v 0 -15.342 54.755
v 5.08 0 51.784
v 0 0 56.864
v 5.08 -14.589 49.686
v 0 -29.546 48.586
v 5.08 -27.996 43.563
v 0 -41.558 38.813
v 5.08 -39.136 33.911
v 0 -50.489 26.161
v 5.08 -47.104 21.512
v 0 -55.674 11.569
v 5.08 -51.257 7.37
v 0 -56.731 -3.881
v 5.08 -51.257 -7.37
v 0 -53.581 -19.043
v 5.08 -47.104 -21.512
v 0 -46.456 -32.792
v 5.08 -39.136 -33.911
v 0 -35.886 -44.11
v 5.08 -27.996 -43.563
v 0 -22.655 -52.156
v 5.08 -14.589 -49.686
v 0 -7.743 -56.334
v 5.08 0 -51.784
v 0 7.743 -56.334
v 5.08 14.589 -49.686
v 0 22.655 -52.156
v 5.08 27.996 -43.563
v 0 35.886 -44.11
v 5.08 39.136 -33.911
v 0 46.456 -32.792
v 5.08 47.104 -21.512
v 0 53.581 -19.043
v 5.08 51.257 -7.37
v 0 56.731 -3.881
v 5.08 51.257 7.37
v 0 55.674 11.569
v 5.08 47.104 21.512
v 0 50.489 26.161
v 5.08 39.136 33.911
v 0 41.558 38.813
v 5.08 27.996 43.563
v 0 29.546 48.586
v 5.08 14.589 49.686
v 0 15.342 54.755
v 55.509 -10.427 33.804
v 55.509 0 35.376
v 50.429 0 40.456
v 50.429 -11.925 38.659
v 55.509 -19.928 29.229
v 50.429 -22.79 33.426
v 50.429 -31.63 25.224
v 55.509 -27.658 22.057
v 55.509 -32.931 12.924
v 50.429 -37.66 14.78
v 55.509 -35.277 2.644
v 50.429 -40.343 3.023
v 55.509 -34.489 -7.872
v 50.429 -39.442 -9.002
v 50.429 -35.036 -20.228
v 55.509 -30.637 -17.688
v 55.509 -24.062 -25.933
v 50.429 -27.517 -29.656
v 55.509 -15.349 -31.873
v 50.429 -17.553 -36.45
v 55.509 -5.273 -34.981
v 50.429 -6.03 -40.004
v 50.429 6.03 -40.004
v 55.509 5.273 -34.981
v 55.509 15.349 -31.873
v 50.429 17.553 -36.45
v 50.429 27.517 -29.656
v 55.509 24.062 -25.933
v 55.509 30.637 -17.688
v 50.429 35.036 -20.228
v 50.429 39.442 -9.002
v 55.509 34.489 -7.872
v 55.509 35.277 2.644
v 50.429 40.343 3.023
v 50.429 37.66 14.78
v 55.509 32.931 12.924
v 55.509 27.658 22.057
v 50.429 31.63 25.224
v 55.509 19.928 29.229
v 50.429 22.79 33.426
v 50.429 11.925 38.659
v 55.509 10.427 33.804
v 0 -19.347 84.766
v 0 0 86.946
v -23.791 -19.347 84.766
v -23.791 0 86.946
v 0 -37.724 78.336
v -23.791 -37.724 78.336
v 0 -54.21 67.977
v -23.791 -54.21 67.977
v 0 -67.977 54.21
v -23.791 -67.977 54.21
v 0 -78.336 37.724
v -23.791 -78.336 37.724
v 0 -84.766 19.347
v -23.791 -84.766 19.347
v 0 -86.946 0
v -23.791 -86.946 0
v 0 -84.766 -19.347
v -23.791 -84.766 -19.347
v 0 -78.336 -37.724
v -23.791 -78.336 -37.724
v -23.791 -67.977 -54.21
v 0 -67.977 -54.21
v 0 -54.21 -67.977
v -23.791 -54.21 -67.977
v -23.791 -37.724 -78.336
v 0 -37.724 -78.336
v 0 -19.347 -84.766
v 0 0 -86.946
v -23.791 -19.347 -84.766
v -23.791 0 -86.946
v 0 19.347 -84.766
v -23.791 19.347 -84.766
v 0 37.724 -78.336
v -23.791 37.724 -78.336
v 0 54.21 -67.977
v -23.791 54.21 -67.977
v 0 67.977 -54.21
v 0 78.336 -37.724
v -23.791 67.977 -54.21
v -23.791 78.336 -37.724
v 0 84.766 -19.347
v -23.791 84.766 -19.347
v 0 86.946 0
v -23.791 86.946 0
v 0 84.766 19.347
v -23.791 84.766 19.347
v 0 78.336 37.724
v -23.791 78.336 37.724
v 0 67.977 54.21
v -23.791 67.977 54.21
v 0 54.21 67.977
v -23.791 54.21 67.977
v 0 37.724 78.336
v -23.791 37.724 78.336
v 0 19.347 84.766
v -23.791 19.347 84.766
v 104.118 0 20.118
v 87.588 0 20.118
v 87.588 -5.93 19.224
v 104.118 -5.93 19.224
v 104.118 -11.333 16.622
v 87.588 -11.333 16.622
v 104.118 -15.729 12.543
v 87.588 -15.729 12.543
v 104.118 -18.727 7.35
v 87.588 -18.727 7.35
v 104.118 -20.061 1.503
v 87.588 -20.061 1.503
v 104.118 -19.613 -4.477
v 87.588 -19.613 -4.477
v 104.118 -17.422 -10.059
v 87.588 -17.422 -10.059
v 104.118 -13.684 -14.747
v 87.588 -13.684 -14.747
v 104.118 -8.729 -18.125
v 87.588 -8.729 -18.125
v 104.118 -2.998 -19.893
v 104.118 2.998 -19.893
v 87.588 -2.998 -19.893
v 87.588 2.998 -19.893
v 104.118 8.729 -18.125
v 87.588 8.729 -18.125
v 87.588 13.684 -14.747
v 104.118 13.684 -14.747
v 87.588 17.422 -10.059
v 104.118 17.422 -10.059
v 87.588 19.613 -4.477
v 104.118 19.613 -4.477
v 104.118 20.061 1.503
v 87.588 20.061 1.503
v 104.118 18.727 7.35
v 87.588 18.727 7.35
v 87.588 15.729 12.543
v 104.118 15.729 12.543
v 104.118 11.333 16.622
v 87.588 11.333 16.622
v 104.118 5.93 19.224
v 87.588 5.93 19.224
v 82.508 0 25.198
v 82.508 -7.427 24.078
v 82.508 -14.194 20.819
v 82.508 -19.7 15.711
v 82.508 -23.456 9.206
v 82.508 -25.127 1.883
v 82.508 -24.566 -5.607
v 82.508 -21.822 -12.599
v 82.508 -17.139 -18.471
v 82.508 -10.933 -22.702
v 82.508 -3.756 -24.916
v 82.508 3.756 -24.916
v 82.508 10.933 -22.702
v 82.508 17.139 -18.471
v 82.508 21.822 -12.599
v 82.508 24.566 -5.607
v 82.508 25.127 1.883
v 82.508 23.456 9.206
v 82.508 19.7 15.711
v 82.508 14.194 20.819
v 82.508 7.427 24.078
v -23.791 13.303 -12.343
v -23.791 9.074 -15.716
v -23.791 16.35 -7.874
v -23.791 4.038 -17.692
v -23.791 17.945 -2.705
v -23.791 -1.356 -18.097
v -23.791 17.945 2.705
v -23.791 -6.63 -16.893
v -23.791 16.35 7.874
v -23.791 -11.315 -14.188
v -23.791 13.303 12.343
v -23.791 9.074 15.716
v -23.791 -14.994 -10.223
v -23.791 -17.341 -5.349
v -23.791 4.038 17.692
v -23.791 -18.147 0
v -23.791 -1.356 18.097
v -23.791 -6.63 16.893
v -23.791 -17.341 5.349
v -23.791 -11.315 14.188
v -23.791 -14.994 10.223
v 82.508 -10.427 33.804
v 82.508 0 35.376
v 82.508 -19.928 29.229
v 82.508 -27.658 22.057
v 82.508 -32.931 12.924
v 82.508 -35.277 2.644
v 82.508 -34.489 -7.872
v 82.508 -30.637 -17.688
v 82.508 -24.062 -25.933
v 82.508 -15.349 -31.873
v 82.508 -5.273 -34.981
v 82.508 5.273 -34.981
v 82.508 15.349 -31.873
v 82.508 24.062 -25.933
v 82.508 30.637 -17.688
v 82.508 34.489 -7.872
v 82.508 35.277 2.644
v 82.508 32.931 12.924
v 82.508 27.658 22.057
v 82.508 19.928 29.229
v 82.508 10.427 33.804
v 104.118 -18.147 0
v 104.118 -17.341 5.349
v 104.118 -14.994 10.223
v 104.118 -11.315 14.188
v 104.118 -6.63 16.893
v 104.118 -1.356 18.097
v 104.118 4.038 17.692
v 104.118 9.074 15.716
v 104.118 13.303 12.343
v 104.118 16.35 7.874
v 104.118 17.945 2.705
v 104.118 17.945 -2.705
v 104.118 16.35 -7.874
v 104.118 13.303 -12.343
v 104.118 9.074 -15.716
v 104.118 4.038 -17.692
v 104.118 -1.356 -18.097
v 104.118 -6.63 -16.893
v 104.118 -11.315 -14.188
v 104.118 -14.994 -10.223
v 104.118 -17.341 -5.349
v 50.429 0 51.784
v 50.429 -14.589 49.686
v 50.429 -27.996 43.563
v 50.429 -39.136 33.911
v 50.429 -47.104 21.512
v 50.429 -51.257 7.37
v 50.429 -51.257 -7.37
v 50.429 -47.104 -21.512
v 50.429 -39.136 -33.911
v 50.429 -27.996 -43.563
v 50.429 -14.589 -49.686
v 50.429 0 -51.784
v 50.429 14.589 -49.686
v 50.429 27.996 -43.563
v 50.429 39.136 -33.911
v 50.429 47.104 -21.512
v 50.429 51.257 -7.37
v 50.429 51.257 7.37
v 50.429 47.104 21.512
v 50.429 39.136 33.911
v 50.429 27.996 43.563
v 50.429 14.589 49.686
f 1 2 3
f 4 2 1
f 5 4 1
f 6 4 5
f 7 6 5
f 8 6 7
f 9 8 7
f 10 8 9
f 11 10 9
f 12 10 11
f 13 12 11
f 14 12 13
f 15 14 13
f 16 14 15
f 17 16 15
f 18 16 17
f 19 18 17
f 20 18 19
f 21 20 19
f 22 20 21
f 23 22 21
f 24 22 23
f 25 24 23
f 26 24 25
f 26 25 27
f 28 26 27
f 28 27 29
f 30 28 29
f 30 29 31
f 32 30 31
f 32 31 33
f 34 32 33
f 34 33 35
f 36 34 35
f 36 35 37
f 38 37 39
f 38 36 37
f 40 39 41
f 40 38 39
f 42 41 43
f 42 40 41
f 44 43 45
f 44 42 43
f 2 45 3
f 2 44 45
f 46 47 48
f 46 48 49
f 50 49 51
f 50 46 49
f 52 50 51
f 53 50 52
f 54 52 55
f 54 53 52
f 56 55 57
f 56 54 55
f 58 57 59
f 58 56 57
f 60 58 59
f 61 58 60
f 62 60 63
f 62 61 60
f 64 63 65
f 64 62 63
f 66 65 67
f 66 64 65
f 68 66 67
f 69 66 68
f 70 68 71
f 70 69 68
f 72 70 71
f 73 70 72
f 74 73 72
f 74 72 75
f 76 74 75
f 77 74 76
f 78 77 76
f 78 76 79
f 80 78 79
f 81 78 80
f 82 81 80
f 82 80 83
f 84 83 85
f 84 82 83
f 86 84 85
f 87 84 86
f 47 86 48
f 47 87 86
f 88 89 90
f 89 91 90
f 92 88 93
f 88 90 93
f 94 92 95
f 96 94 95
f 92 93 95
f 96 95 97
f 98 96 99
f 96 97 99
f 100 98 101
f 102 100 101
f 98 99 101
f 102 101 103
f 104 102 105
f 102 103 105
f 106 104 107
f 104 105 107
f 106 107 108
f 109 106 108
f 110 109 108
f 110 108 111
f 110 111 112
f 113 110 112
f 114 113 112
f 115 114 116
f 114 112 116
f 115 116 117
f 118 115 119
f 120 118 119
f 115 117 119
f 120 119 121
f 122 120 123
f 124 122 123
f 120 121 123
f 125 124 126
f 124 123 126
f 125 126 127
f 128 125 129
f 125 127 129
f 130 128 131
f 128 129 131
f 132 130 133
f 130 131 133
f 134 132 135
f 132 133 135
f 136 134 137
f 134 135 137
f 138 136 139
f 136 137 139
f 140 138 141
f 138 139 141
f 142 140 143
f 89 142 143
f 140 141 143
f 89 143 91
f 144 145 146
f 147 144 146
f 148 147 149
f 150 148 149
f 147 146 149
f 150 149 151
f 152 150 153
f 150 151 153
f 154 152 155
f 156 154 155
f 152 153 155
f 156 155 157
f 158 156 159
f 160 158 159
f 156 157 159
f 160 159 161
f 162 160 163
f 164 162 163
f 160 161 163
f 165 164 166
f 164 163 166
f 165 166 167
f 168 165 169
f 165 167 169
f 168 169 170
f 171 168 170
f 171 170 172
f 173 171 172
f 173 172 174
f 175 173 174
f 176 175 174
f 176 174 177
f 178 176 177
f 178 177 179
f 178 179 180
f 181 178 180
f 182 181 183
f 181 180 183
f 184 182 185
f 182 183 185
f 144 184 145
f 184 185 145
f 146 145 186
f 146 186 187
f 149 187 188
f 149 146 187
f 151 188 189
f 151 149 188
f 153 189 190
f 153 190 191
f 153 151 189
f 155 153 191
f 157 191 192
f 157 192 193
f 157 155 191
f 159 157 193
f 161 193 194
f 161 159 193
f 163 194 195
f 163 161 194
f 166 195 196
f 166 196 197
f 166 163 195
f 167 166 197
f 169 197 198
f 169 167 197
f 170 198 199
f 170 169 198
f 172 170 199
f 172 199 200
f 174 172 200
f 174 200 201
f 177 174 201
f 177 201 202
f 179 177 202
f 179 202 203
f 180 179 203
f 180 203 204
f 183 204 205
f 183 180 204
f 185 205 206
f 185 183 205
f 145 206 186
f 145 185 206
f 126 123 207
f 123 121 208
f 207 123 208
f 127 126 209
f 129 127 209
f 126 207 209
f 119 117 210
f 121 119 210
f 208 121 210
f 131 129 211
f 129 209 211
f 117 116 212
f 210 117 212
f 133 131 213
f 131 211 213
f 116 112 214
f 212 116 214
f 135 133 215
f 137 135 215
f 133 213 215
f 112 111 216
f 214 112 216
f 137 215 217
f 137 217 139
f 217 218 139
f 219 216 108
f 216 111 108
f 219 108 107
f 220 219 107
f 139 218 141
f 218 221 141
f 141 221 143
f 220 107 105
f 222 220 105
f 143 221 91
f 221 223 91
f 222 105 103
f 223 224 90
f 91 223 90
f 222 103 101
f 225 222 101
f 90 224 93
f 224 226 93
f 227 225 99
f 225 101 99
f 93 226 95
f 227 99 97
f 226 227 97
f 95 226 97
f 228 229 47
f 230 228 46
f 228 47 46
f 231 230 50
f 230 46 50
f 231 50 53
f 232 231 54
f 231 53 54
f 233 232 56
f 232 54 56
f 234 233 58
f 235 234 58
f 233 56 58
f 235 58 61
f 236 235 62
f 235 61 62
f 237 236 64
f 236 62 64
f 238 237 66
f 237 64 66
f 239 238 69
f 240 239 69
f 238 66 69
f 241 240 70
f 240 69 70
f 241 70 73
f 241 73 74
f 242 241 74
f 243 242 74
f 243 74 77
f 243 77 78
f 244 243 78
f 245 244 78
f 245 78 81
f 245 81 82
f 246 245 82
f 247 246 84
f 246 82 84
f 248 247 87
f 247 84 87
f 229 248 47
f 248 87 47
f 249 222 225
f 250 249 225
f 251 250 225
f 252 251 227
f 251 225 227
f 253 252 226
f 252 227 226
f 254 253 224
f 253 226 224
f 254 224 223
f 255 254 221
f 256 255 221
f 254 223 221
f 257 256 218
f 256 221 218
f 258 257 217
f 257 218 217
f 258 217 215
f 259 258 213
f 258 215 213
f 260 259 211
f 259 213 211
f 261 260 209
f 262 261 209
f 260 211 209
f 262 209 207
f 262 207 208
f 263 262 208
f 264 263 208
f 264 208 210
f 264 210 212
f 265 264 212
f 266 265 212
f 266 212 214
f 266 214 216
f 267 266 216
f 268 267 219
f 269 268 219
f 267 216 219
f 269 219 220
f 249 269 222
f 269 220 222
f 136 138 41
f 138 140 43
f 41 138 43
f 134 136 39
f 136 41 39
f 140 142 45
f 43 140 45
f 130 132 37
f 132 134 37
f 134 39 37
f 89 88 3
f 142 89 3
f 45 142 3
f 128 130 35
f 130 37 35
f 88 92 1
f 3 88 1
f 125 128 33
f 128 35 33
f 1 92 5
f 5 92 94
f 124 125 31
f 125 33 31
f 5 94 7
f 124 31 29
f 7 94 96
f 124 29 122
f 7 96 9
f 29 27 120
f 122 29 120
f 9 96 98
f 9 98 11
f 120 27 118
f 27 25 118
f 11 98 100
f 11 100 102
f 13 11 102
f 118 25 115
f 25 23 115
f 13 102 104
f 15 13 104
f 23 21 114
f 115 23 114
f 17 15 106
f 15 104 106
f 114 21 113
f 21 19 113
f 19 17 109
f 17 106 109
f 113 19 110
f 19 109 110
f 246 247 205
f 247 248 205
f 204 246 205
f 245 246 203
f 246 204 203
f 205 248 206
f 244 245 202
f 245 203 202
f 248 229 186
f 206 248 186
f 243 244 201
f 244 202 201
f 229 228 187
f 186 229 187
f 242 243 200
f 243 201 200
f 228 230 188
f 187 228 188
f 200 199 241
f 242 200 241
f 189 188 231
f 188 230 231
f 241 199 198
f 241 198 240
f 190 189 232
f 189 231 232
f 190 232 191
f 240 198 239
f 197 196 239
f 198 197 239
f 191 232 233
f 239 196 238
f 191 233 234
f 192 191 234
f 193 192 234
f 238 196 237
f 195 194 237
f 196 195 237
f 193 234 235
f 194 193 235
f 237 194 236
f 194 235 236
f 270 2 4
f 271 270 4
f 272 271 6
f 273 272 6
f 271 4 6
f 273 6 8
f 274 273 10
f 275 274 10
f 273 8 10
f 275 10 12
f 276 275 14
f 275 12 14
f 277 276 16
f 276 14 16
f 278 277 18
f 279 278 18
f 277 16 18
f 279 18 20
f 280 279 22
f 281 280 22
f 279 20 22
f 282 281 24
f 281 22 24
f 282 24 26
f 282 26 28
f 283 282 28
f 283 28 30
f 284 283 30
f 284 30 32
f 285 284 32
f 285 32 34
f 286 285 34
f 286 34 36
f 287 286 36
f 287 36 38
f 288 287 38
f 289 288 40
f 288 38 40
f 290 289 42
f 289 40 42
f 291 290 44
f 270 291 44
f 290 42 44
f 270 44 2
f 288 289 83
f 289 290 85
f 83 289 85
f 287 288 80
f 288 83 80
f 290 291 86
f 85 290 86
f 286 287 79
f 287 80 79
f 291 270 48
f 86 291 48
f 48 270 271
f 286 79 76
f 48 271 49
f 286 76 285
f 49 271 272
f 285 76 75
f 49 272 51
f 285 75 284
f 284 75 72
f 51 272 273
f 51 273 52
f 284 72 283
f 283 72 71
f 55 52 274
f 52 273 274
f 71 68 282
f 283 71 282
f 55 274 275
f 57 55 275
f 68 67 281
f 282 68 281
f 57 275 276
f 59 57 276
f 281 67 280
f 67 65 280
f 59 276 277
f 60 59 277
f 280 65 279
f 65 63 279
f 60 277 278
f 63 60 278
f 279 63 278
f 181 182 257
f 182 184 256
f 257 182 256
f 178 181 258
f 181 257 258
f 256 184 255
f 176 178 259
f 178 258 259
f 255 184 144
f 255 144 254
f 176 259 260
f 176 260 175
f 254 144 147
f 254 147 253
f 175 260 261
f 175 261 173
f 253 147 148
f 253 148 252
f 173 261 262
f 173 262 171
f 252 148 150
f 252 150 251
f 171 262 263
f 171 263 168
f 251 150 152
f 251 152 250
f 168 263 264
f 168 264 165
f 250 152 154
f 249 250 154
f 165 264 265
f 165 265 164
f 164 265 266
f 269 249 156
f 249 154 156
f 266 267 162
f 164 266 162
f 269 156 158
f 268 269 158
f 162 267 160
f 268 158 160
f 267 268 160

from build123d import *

# Parameters (mm, degrees)
F2_SIZE  = 5.08
F3_SIZE  = 5.08
F4_R     = 18.147419
F5_DEPTH = 127.908953


with BuildPart() as f1:
    # F0 (on Front) → F1 (revolve)
    with BuildSketch(Plane.XZ):
        Polygon((0, 51.78383), (0, 86.945966), (-23.790576, 86.945966), (-23.790576, 0), (0, 0), (104.118377, 0), (104.118377, 20.117693), (82.508355, 20.117693), (82.508355, 35.376113), (50.429285, 35.376113), (50.429285, 51.78383), align=None)
    revolve(axis=Axis((-54.851383, 0, 0), (1, 0, 0)))

    # F2
    f2_edges = [f1.edges().sort_by_distance(p)[0] for p in [
        (0, 0, -51.78383),
    ]]
    chamfer(f2_edges, length=F2_SIZE)

    # F3
    f3_edges = [f1.edges().sort_by_distance(p)[0] for p in [
        (50.429285, 0, -35.376113),
        (82.508355, 0, -20.117693),
    ]]
    chamfer(f3_edges, length=F3_SIZE)

    # F4 (on face) → F5 (cut, through all)
    with BuildSketch(Plane(origin=(-23.790576, 0, 0), x_dir=(0, -1, 0), z_dir=(-1, 0, 0))):
        Circle(F4_R)
    extrude(amount=-F5_DEPTH, mode=Mode.SUBTRACT)


solid = f1.part
